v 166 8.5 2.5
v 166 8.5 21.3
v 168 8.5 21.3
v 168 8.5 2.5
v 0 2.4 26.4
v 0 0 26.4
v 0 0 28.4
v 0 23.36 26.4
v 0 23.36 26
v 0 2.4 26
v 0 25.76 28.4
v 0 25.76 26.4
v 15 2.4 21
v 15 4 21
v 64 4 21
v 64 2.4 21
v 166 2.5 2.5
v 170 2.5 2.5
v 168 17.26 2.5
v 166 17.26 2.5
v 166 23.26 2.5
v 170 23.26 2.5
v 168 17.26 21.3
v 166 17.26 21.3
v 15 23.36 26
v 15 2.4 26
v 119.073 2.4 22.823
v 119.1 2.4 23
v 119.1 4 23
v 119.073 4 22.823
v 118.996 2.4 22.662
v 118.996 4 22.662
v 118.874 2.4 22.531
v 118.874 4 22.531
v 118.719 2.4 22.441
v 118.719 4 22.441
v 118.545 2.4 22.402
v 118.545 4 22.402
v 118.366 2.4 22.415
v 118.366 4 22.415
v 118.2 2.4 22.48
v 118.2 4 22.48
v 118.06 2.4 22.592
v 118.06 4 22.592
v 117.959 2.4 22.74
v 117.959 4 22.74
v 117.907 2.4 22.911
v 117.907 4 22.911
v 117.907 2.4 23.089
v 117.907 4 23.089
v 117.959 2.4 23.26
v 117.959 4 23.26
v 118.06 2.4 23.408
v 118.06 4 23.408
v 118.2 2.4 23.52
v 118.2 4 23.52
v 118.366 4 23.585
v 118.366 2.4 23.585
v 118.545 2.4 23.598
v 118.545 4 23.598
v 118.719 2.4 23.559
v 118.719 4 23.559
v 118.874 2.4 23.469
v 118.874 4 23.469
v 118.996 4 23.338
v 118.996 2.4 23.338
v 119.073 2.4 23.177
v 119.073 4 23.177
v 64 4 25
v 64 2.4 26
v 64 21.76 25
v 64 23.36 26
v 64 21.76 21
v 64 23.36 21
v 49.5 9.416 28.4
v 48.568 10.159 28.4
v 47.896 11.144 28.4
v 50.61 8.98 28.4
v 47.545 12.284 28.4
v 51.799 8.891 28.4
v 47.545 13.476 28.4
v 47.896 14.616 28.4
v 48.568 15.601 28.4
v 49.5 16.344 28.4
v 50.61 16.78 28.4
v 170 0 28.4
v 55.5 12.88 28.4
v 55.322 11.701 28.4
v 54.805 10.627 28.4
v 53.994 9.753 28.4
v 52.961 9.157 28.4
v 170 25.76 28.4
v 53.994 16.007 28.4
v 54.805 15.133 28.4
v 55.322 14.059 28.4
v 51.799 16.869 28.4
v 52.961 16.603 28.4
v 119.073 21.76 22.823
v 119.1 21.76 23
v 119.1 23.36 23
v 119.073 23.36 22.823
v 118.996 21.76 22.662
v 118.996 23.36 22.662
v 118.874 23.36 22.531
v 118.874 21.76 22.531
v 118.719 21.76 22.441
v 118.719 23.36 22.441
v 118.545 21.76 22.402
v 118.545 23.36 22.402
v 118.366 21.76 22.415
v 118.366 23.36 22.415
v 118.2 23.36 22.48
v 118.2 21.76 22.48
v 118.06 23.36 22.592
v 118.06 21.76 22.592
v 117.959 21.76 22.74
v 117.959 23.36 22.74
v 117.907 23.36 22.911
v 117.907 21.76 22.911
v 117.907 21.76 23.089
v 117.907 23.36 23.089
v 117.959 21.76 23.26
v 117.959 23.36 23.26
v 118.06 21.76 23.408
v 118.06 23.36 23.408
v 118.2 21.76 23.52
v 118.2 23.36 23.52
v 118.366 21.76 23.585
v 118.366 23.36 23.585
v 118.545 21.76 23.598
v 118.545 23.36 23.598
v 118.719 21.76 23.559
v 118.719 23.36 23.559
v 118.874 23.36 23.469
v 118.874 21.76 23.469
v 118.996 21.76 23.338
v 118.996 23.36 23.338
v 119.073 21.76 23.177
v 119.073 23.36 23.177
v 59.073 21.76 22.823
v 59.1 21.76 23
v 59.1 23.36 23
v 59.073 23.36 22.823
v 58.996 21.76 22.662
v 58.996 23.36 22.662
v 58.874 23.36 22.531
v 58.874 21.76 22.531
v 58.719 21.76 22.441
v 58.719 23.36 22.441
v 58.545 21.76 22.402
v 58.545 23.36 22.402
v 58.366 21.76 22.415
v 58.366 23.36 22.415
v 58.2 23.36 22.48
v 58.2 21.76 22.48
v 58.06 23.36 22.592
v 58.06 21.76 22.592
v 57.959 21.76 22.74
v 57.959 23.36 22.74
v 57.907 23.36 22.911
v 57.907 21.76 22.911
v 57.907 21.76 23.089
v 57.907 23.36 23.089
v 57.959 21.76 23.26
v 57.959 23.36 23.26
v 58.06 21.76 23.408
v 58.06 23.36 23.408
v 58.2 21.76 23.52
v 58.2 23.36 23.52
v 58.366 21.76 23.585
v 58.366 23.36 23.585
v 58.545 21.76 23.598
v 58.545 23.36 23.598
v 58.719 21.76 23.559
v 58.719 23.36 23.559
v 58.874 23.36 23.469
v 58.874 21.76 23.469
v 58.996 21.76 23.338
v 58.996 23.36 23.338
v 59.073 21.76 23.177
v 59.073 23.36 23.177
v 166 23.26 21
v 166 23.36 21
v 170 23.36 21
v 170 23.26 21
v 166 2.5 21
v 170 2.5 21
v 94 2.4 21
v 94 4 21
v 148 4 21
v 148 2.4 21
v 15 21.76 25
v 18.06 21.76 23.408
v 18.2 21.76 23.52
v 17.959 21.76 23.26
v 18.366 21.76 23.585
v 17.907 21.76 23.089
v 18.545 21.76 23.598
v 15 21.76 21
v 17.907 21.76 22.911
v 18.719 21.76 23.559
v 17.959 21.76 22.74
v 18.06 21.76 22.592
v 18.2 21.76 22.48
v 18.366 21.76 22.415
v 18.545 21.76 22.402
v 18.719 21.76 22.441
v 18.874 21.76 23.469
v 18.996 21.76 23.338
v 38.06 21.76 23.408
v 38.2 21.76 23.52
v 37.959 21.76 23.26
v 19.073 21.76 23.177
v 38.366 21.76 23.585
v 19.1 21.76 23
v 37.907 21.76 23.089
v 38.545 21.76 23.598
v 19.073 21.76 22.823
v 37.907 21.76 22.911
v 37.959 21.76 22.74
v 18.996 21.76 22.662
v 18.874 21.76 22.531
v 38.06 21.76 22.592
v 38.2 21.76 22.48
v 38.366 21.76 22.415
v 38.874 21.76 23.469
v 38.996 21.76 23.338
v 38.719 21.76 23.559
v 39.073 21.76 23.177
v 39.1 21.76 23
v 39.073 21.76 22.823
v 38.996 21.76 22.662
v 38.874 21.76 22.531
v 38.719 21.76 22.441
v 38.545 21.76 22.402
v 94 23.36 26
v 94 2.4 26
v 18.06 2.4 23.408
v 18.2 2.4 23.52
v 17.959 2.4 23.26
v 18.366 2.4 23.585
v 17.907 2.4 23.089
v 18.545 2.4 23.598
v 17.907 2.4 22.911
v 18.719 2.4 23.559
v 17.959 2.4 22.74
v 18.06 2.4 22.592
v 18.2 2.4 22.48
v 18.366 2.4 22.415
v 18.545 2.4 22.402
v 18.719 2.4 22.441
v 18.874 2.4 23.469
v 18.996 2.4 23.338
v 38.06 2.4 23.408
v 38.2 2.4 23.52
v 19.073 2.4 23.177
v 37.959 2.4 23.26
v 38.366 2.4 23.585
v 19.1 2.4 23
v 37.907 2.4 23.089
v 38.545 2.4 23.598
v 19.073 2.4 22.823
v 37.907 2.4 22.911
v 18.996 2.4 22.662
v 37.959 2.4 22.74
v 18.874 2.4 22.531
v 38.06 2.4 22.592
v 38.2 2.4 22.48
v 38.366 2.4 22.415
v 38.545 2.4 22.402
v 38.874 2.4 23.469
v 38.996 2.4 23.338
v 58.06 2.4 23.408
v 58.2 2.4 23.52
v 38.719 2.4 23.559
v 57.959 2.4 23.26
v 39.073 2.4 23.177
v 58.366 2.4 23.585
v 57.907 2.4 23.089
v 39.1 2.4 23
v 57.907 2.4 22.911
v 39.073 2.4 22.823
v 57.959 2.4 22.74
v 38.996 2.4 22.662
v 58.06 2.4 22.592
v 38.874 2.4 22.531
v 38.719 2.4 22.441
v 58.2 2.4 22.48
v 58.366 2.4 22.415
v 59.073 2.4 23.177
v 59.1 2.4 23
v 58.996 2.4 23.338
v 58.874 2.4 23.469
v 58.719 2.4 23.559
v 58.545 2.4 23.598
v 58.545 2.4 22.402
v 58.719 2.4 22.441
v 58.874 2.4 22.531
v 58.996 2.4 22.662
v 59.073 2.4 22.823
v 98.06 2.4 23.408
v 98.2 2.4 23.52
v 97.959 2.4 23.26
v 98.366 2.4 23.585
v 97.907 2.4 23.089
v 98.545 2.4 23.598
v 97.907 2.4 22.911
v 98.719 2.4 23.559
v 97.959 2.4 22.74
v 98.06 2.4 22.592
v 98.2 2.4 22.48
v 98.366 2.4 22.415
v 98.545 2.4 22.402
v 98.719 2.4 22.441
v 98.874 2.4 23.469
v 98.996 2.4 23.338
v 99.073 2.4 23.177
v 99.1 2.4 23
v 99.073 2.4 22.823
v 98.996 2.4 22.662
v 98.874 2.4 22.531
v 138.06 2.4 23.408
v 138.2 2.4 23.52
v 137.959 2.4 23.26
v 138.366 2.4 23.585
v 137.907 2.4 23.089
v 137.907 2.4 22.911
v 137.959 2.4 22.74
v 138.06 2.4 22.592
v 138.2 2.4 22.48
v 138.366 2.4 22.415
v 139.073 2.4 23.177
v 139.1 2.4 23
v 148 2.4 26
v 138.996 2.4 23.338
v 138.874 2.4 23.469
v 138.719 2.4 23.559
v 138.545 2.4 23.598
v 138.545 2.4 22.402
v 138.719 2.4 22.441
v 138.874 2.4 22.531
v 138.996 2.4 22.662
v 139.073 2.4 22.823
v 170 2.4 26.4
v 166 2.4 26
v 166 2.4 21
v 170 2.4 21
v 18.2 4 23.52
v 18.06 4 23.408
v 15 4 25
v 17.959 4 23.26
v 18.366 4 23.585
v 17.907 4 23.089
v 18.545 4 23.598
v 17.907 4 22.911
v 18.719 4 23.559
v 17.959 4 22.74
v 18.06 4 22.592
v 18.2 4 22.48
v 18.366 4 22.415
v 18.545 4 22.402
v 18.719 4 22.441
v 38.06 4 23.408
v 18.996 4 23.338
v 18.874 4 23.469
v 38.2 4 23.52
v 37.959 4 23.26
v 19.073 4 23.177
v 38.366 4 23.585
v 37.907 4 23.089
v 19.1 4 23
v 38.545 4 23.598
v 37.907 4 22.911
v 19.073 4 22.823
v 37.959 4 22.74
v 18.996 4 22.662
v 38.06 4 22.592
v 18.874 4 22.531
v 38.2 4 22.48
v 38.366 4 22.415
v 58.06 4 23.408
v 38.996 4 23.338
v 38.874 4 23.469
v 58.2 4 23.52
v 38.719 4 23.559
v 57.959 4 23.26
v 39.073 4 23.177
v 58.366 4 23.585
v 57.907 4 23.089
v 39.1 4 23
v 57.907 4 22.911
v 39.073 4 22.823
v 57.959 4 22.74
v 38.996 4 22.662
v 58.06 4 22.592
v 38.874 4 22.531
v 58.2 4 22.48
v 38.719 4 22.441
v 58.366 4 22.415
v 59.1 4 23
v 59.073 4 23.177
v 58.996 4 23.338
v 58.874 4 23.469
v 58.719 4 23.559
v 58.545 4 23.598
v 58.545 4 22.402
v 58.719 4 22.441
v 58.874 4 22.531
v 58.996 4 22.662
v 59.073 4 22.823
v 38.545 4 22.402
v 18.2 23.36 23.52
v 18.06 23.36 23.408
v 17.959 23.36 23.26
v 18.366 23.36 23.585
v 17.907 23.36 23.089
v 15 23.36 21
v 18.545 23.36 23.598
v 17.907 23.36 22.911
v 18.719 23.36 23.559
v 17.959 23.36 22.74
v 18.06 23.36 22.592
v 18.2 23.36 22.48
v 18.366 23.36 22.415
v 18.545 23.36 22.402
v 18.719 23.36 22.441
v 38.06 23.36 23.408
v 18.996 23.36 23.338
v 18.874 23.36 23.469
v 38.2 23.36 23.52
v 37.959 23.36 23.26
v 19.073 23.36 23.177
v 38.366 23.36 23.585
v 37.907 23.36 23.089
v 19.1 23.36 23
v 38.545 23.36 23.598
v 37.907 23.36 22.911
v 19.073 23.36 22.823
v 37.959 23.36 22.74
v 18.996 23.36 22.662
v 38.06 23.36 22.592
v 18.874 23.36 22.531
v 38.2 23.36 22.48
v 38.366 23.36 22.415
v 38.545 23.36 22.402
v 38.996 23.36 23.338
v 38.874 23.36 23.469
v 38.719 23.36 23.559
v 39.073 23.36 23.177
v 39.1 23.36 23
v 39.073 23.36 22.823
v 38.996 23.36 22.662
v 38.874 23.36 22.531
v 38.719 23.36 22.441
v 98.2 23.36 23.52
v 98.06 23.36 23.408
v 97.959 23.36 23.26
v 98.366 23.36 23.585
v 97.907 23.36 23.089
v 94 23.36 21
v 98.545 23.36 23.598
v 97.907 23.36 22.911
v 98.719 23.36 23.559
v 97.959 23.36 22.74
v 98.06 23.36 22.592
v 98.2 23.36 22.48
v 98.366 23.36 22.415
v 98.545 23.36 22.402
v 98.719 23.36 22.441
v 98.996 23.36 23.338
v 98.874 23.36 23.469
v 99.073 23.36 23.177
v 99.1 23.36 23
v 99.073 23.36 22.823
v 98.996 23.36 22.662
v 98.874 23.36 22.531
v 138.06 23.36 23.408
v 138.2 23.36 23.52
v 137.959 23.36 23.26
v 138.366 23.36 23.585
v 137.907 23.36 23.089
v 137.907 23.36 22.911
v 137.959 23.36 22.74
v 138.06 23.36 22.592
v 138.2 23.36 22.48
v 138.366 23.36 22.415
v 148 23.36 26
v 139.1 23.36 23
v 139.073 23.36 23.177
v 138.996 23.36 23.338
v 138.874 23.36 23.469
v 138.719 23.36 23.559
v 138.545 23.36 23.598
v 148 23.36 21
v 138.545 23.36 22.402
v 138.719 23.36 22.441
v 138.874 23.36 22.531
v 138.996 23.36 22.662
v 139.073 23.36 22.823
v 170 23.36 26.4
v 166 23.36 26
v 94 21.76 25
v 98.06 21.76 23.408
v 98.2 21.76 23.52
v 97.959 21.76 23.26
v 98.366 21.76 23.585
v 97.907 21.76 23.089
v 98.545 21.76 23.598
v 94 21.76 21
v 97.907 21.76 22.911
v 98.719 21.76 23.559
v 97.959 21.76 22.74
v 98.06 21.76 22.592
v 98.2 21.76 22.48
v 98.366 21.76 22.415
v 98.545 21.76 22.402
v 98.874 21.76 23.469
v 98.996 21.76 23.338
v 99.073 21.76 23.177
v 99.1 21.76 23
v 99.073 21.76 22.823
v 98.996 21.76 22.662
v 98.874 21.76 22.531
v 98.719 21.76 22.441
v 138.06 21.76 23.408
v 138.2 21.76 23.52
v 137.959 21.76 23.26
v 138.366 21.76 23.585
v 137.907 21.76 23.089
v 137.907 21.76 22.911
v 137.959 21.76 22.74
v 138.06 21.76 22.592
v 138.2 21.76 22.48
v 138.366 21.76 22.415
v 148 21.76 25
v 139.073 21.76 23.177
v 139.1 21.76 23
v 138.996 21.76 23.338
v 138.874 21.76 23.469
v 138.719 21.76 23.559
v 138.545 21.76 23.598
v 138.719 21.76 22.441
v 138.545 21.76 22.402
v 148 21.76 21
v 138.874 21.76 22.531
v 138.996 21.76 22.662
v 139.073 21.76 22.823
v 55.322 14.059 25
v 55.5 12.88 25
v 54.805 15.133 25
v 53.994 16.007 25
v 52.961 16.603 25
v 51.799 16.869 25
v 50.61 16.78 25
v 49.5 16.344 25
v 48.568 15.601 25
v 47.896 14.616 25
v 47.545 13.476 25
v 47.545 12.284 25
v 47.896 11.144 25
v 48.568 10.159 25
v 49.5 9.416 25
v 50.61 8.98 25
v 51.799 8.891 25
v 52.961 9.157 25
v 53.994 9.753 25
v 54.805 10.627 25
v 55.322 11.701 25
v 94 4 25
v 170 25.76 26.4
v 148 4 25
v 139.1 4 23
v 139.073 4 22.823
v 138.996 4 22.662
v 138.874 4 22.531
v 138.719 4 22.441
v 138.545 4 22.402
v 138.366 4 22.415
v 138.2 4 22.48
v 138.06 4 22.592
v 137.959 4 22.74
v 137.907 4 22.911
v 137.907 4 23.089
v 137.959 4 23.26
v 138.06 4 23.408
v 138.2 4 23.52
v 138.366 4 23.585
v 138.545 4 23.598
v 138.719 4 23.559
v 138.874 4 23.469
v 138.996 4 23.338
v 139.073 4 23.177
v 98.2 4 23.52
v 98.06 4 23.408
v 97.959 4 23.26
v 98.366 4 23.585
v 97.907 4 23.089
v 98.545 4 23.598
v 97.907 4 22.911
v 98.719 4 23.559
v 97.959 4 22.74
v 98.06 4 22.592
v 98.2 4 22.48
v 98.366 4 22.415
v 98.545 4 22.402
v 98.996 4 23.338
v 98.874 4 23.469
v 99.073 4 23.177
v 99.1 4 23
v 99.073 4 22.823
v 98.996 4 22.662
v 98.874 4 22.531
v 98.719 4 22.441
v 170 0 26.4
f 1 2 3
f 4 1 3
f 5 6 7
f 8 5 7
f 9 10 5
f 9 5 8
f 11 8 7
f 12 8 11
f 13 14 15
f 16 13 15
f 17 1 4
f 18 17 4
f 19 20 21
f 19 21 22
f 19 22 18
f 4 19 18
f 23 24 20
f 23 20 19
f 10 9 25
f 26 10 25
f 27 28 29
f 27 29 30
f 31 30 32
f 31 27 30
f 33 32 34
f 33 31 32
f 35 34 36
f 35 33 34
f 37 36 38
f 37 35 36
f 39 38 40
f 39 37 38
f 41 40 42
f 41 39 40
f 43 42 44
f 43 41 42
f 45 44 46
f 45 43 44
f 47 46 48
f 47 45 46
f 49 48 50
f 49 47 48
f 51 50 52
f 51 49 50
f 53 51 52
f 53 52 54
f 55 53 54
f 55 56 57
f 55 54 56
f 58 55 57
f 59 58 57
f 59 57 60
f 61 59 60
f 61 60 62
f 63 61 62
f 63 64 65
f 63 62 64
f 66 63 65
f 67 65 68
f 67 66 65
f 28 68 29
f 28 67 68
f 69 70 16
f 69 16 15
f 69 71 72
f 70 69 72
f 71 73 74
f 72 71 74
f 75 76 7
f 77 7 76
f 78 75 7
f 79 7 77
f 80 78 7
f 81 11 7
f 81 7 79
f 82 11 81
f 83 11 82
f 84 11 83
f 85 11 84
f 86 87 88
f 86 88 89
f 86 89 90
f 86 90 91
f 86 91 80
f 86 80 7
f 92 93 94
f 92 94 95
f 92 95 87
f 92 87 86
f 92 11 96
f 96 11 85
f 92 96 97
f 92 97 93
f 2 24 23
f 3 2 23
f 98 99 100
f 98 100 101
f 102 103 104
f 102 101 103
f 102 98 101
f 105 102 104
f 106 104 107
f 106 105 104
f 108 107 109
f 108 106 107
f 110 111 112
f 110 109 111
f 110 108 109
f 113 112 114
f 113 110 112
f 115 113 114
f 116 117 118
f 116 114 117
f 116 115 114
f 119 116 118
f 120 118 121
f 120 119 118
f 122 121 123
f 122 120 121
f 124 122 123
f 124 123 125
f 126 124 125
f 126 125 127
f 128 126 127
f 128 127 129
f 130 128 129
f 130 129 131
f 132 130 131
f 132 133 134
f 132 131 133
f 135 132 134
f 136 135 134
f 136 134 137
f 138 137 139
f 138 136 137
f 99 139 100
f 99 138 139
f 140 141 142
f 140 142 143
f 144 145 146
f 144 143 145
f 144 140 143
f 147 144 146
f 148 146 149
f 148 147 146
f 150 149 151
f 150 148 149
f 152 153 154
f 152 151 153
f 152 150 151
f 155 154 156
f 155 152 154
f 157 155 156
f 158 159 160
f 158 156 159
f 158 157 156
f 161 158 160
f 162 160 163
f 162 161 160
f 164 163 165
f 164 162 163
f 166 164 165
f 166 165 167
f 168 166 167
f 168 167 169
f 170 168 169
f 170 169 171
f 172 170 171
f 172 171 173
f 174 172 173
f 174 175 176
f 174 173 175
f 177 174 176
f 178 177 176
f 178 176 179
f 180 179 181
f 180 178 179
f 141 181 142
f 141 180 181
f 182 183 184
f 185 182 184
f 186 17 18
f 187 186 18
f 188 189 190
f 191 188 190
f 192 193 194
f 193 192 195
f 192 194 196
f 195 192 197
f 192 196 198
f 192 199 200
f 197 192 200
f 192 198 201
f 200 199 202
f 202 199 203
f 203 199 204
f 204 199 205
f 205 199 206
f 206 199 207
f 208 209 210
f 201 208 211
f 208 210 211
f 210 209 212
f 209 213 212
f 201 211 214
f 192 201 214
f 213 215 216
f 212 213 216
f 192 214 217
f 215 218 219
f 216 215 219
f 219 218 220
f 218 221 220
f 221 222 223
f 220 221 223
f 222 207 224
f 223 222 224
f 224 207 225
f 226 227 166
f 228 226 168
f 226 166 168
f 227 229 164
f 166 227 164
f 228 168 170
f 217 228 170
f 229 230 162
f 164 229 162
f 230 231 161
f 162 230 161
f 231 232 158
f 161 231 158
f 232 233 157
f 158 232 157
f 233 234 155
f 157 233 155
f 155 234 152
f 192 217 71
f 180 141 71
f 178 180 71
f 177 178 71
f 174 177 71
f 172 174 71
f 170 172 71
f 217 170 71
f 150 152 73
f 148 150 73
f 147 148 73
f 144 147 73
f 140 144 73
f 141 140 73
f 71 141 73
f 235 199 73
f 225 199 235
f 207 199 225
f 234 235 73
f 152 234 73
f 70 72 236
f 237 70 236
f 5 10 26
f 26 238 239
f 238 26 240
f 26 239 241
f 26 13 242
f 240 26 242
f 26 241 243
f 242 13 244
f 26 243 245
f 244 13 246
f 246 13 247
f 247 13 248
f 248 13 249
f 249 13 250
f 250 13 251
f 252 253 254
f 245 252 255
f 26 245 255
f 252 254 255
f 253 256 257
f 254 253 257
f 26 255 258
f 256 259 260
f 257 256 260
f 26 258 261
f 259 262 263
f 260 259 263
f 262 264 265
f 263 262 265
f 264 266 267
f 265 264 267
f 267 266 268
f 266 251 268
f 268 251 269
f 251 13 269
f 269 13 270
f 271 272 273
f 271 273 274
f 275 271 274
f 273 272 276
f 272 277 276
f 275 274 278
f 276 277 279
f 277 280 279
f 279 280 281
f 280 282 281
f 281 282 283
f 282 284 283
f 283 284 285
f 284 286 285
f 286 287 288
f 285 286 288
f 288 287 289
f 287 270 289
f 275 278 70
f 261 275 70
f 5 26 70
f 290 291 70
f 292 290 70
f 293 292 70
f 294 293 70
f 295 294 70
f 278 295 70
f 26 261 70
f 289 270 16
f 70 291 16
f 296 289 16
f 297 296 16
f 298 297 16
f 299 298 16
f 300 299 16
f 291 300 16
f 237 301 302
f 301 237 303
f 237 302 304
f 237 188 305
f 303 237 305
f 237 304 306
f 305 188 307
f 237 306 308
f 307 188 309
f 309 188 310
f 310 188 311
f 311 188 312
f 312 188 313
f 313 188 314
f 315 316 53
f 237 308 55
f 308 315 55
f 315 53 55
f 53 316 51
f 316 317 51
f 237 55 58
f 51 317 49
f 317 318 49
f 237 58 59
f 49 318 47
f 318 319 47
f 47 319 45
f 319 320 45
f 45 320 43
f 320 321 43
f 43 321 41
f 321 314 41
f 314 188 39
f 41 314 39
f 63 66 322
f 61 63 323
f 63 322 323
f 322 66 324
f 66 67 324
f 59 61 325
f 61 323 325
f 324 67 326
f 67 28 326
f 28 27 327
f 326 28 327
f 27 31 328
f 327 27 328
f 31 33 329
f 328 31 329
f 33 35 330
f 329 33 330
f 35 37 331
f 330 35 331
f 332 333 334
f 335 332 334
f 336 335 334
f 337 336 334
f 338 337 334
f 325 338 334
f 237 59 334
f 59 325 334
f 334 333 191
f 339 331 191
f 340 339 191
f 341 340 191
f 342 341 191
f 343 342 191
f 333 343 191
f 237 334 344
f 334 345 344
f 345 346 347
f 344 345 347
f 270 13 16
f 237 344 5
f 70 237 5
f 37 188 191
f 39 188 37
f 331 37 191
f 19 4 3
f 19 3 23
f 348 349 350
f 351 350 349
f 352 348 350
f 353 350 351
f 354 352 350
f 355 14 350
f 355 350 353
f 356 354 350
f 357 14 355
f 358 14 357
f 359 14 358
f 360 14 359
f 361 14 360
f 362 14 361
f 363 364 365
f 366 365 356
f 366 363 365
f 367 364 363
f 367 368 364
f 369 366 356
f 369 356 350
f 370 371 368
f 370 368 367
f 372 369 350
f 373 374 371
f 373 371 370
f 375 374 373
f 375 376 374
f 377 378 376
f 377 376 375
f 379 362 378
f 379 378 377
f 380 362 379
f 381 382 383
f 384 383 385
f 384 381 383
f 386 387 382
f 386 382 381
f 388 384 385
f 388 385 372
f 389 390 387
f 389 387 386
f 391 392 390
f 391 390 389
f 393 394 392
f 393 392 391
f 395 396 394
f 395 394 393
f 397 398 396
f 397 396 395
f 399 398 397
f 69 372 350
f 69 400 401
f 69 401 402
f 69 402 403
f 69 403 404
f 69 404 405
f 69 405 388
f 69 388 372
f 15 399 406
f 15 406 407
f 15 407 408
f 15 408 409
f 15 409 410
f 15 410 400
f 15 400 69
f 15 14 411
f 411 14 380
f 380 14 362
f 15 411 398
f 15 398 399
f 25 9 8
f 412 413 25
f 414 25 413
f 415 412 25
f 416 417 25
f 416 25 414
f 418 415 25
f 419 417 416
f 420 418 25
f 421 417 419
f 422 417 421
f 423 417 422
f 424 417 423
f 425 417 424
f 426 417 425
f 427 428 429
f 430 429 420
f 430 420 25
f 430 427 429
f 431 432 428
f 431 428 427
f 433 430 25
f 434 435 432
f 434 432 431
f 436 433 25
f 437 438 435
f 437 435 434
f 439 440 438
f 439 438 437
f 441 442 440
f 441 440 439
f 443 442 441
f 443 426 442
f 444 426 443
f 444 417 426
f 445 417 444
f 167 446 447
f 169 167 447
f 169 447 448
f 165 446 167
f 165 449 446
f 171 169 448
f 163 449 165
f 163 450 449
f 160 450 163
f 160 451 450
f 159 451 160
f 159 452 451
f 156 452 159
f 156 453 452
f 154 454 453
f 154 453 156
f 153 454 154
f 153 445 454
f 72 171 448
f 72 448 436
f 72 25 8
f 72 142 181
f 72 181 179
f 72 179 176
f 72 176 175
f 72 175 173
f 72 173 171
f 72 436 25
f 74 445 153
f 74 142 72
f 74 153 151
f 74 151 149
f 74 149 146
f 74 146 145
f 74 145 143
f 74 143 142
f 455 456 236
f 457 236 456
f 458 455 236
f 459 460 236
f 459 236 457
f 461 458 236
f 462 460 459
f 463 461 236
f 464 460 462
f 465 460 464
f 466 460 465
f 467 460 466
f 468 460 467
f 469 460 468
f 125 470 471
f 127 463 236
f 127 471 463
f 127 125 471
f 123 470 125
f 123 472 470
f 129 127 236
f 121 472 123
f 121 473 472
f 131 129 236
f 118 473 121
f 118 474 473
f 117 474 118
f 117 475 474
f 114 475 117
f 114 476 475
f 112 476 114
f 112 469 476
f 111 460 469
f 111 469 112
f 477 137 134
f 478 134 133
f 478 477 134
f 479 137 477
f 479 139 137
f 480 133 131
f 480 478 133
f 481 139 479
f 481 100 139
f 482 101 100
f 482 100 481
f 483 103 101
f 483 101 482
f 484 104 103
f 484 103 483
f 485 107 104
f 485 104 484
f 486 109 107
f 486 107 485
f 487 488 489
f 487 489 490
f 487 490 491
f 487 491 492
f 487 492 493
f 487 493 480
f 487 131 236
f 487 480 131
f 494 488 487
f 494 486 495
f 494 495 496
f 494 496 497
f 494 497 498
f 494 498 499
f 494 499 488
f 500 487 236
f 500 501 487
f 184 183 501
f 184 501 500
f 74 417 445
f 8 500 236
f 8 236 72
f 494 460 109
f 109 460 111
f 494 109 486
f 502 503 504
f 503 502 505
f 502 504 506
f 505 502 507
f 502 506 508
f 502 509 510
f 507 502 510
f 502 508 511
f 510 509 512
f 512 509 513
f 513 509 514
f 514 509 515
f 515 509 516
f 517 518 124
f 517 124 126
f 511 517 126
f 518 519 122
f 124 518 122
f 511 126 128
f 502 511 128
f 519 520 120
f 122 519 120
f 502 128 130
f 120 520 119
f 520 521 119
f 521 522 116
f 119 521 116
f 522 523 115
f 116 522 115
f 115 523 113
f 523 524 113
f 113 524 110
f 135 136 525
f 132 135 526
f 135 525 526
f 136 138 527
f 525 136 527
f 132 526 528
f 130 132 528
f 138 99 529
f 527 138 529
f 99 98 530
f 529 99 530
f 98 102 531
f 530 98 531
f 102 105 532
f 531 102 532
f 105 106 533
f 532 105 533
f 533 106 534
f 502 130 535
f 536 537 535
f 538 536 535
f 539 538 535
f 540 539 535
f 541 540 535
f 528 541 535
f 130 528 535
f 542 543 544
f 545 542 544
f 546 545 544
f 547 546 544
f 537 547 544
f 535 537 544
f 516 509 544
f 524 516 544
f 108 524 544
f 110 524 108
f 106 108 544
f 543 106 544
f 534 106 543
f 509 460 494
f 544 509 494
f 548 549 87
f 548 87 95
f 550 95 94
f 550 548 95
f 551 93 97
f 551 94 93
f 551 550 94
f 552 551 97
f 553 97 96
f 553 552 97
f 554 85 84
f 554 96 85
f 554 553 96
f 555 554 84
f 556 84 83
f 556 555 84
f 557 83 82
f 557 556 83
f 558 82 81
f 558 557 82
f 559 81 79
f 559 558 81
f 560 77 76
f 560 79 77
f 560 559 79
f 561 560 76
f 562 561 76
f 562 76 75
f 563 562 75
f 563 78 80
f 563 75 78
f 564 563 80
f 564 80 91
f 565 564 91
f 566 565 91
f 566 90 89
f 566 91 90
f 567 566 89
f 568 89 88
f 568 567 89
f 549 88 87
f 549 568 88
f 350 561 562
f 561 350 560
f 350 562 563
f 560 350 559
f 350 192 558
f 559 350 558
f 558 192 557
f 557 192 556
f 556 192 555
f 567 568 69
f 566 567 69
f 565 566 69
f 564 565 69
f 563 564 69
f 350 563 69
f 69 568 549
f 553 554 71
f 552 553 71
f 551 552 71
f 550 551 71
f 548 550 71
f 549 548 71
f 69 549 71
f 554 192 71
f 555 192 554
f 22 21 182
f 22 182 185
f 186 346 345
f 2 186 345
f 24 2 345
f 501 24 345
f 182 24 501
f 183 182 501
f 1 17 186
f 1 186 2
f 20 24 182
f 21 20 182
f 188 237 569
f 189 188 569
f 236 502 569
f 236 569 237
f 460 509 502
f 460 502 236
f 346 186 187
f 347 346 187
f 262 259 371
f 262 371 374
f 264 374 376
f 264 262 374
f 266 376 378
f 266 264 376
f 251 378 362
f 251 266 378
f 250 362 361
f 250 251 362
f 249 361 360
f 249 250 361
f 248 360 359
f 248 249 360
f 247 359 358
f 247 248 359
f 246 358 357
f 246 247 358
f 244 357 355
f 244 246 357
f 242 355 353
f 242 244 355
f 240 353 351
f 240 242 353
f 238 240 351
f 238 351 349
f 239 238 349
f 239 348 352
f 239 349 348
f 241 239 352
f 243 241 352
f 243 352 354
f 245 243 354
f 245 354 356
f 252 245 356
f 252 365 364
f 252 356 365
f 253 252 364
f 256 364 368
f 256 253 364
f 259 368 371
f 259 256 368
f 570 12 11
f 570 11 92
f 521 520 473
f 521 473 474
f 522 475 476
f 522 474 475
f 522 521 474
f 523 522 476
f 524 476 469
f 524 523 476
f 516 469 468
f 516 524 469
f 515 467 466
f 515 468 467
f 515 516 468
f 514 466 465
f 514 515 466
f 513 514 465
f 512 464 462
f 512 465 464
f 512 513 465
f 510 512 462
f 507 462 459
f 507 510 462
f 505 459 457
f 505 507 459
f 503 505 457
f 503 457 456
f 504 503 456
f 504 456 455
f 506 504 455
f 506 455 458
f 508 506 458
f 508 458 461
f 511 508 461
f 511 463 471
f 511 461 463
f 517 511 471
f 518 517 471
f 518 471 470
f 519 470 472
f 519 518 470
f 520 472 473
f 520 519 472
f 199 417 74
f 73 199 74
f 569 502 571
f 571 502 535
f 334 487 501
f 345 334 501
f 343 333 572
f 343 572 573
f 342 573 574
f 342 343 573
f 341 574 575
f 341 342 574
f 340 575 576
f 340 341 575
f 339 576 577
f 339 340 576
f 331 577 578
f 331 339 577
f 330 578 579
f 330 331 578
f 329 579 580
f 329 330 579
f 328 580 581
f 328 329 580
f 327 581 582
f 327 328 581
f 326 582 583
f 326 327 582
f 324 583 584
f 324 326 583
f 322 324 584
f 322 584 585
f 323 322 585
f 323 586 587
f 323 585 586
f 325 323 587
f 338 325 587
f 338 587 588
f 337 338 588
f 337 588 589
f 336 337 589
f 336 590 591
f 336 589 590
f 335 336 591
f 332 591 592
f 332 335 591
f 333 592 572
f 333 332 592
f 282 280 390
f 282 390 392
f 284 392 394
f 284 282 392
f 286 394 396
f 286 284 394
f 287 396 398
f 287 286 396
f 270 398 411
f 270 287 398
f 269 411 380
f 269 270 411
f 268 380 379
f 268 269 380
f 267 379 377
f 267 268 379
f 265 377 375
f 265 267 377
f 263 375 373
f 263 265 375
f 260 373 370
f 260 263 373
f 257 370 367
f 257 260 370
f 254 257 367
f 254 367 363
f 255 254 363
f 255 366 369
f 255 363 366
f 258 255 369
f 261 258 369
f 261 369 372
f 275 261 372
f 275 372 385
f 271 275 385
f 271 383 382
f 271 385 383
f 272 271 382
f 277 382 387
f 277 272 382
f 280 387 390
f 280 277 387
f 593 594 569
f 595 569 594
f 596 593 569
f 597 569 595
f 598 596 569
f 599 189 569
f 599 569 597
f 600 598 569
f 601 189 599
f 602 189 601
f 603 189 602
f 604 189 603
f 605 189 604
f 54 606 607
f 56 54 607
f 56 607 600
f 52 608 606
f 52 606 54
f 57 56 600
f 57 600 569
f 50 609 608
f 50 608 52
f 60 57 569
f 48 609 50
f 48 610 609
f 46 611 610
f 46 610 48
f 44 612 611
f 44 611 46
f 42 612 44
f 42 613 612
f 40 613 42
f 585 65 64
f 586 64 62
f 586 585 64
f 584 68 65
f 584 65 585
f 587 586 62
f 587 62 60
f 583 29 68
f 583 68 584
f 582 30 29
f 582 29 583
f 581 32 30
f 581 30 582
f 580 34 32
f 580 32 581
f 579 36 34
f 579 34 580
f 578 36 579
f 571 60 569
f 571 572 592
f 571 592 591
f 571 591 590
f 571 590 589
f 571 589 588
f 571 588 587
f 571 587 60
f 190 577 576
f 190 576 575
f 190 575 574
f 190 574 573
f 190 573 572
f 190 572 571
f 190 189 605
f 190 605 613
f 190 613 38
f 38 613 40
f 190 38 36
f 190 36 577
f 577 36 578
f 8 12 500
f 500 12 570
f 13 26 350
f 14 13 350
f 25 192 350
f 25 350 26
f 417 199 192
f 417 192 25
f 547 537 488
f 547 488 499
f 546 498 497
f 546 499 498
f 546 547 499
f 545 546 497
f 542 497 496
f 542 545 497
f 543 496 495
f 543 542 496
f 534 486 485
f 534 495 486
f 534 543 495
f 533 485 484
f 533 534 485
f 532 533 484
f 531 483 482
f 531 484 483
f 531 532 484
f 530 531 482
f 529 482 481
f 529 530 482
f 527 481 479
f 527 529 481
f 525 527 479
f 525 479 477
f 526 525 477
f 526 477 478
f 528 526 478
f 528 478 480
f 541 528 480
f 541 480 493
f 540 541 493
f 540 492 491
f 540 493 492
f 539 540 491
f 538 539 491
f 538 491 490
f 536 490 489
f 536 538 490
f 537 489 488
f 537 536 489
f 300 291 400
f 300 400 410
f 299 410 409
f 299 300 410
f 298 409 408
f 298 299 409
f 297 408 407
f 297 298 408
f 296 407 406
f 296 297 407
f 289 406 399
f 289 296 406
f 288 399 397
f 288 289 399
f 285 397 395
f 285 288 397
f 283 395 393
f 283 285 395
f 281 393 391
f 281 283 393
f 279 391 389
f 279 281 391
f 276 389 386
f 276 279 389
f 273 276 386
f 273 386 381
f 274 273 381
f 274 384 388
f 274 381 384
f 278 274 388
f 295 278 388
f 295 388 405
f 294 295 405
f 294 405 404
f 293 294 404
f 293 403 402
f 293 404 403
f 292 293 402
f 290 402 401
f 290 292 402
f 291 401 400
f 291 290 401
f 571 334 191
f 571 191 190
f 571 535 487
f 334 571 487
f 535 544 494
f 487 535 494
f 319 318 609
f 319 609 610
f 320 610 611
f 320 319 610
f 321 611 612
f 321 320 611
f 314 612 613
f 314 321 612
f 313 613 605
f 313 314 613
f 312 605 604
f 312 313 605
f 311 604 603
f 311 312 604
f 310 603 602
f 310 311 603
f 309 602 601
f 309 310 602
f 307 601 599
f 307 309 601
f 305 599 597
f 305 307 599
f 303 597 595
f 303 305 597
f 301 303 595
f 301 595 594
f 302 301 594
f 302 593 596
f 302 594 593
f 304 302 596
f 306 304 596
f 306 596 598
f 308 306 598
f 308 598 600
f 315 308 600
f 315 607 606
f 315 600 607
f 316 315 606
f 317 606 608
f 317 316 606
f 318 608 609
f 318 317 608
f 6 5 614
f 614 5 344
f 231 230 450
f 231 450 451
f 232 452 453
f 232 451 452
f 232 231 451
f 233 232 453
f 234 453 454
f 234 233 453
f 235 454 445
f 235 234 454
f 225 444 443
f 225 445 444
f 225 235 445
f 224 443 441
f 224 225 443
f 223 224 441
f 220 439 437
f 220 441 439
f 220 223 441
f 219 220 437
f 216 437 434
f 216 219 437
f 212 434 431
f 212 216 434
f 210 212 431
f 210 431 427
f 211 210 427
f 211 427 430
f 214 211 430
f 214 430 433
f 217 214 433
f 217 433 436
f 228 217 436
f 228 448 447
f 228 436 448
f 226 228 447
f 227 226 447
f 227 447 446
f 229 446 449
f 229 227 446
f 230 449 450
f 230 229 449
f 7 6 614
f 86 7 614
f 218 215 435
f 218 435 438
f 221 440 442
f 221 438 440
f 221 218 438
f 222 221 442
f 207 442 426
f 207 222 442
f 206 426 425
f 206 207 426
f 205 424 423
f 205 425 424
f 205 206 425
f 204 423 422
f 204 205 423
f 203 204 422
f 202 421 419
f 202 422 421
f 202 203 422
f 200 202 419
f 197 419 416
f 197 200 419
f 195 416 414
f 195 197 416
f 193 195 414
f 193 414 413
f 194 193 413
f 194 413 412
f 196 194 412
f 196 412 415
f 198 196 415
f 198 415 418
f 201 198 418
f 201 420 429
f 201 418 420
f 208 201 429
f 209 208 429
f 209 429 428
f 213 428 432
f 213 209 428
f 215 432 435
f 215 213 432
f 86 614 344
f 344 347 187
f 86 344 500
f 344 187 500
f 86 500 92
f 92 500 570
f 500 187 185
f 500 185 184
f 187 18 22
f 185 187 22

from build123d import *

# Parameters (mm, degrees)
CYLINDER002_R     = 0.6
CYLINDER002_DEPTH = 100
ARRAY003_X_COUNT  = 8
ARRAY003_X_PITCH  = 20
BOX009_W          = 15
BOX009_H          = 25.76
BOX009_DEPTH      = 10
BOX010_W          = 30
BOX010_H          = 25.76
BOX010_DEPTH      = 10
BOX011_W          = 18
BOX011_H          = 25.76
BOX011_DEPTH      = 10
CYLINDER004_R     = 4
CYLINDER004_DEPTH = 10
BOX012_W          = 2
BOX012_H          = 8.76
BOX012_DEPTH      = 21.3
BOX005_W          = 166
BOX005_H          = 17.76
BOX005_DEPTH      = 6
BOX006_W          = 170
BOX006_H          = 25.76
BOX006_DEPTH      = 2
BOX008_W          = 2
BOX008_H          = 20.76
BOX008_DEPTH      = 25.8
BOX007_W          = 2
BOX007_H          = 20.76
BOX007_DEPTH      = 22.2
BOX004_W          = 170
BOX004_H          = 20.96
BOX004_DEPTH      = 6


with BuildPart() as array003:
    # Cylinder002 → Cylinder002 (new body)
    with BuildSketch(Plane(origin=(18.5, -32.5, 23), x_dir=(1, 0, 0), z_dir=(0, 1, 0))):
        Circle(CYLINDER002_R)
    extrude(amount=CYLINDER002_DEPTH)

    # Array003 X: Array003 ×8


with BuildPart() as array003_1:
    add(array003.part)
    with Locations(*[(i * ARRAY003_X_PITCH, 0, 0) for i in range(1, ARRAY003_X_COUNT)]):
        add(array003.part)


with BuildPart() as cube009:
    # Box009 → Box009 (new body)
    with BuildSketch(Plane.XY.offset(16)):
        with Locations((7.5, 12.88)):
            Rectangle(BOX009_W, BOX009_H)
    extrude(amount=BOX009_DEPTH)


with BuildPart() as cube010:
    # Box010 → Box010 (new body)
    with BuildSketch(Plane(origin=(64, 0, 16), x_dir=(1, 0, 0), z_dir=(0, 0, 1))):
        with Locations((15, 12.88)):
            Rectangle(BOX010_W, BOX010_H)
    extrude(amount=BOX010_DEPTH)


with BuildPart() as cube011:
    # Box011 → Box011 (new body)
    with BuildSketch(Plane(origin=(148, 0, 16), x_dir=(1, 0, 0), z_dir=(0, 0, 1))):
        with Locations((9, 12.88)):
            Rectangle(BOX011_W, BOX011_H)
    extrude(amount=BOX011_DEPTH)


with BuildPart() as cylinder004:
    # Cylinder004 → Cylinder004 (new body)
    with BuildSketch(Plane(origin=(51.5, 12.88, 20), x_dir=(1, 0, 0), z_dir=(0, 0, 1))):
        Circle(CYLINDER004_R)
    extrude(amount=CYLINDER004_DEPTH)


with BuildPart() as cube012:
    # Box012 → Box012 (new body)
    with BuildSketch(Plane(origin=(166, 8.5, 0), x_dir=(1, 0, 0), z_dir=(0, 0, 1))):
        with Locations((1, 4.38)):
            Rectangle(BOX012_W, BOX012_H)
    extrude(amount=BOX012_DEPTH)


with BuildPart() as cut_out_fusion:
    # Box005 → Box005 (new body)
    with BuildSketch(Plane(origin=(0, 4, 19), x_dir=(1, 0, 0), z_dir=(0, 0, 1))):
        with Locations((83, 8.88)):
            Rectangle(BOX005_W, BOX005_H)
    extrude(amount=BOX005_DEPTH)

    # Fusion002: union Array003, Cube009, Cube010, Cube011, Cylinder004, Cube012
    add(array003_1.part)
    add(cube009.part)
    add(cube010.part)
    add(cube011.part)
    add(cylinder004.part)
    add(cube012.part)


with BuildPart() as cube006:
    # Box006 → Box006 (new body)
    with BuildSketch(Plane.XY.offset(26.4)):
        with Locations((85, 12.88)):
            Rectangle(BOX006_W, BOX006_H)
    extrude(amount=BOX006_DEPTH)


with BuildPart() as cube008:
    # Box008 → Box008 (new body)
    with BuildSketch(Plane(origin=(168, 2.5, 2.5), x_dir=(1, 0, 0), z_dir=(0, 0, 1))):
        with Locations((1, 10.38)):
            Rectangle(BOX008_W, BOX008_H)
    extrude(amount=BOX008_DEPTH)


with BuildPart() as cube007:
    # Box007 → Box007 (new body)
    with BuildSketch(Plane(origin=(166, 2.5, 2.5), x_dir=(1, 0, 0), z_dir=(0, 0, 1))):
        with Locations((1, 10.38)):
            Rectangle(BOX007_W, BOX007_H)
    extrude(amount=BOX007_DEPTH)


with BuildPart() as lid_cut:
    # Box004 → Box004 (new body)
    with BuildSketch(Plane(origin=(0, 2.4, 21), x_dir=(1, 0, 0), z_dir=(0, 0, 1))):
        with Locations((85, 10.48)):
            Rectangle(BOX004_W, BOX004_H)
    extrude(amount=BOX004_DEPTH)

    # Fusion001: union Cube006, Cube008, Cube007
    add(cube006.part)
    add(cube008.part)
    add(cube007.part)

    # Cut002: cut cut out fusion
    add(cut_out_fusion.part, mode=Mode.SUBTRACT)


solid = lid_cut.part
